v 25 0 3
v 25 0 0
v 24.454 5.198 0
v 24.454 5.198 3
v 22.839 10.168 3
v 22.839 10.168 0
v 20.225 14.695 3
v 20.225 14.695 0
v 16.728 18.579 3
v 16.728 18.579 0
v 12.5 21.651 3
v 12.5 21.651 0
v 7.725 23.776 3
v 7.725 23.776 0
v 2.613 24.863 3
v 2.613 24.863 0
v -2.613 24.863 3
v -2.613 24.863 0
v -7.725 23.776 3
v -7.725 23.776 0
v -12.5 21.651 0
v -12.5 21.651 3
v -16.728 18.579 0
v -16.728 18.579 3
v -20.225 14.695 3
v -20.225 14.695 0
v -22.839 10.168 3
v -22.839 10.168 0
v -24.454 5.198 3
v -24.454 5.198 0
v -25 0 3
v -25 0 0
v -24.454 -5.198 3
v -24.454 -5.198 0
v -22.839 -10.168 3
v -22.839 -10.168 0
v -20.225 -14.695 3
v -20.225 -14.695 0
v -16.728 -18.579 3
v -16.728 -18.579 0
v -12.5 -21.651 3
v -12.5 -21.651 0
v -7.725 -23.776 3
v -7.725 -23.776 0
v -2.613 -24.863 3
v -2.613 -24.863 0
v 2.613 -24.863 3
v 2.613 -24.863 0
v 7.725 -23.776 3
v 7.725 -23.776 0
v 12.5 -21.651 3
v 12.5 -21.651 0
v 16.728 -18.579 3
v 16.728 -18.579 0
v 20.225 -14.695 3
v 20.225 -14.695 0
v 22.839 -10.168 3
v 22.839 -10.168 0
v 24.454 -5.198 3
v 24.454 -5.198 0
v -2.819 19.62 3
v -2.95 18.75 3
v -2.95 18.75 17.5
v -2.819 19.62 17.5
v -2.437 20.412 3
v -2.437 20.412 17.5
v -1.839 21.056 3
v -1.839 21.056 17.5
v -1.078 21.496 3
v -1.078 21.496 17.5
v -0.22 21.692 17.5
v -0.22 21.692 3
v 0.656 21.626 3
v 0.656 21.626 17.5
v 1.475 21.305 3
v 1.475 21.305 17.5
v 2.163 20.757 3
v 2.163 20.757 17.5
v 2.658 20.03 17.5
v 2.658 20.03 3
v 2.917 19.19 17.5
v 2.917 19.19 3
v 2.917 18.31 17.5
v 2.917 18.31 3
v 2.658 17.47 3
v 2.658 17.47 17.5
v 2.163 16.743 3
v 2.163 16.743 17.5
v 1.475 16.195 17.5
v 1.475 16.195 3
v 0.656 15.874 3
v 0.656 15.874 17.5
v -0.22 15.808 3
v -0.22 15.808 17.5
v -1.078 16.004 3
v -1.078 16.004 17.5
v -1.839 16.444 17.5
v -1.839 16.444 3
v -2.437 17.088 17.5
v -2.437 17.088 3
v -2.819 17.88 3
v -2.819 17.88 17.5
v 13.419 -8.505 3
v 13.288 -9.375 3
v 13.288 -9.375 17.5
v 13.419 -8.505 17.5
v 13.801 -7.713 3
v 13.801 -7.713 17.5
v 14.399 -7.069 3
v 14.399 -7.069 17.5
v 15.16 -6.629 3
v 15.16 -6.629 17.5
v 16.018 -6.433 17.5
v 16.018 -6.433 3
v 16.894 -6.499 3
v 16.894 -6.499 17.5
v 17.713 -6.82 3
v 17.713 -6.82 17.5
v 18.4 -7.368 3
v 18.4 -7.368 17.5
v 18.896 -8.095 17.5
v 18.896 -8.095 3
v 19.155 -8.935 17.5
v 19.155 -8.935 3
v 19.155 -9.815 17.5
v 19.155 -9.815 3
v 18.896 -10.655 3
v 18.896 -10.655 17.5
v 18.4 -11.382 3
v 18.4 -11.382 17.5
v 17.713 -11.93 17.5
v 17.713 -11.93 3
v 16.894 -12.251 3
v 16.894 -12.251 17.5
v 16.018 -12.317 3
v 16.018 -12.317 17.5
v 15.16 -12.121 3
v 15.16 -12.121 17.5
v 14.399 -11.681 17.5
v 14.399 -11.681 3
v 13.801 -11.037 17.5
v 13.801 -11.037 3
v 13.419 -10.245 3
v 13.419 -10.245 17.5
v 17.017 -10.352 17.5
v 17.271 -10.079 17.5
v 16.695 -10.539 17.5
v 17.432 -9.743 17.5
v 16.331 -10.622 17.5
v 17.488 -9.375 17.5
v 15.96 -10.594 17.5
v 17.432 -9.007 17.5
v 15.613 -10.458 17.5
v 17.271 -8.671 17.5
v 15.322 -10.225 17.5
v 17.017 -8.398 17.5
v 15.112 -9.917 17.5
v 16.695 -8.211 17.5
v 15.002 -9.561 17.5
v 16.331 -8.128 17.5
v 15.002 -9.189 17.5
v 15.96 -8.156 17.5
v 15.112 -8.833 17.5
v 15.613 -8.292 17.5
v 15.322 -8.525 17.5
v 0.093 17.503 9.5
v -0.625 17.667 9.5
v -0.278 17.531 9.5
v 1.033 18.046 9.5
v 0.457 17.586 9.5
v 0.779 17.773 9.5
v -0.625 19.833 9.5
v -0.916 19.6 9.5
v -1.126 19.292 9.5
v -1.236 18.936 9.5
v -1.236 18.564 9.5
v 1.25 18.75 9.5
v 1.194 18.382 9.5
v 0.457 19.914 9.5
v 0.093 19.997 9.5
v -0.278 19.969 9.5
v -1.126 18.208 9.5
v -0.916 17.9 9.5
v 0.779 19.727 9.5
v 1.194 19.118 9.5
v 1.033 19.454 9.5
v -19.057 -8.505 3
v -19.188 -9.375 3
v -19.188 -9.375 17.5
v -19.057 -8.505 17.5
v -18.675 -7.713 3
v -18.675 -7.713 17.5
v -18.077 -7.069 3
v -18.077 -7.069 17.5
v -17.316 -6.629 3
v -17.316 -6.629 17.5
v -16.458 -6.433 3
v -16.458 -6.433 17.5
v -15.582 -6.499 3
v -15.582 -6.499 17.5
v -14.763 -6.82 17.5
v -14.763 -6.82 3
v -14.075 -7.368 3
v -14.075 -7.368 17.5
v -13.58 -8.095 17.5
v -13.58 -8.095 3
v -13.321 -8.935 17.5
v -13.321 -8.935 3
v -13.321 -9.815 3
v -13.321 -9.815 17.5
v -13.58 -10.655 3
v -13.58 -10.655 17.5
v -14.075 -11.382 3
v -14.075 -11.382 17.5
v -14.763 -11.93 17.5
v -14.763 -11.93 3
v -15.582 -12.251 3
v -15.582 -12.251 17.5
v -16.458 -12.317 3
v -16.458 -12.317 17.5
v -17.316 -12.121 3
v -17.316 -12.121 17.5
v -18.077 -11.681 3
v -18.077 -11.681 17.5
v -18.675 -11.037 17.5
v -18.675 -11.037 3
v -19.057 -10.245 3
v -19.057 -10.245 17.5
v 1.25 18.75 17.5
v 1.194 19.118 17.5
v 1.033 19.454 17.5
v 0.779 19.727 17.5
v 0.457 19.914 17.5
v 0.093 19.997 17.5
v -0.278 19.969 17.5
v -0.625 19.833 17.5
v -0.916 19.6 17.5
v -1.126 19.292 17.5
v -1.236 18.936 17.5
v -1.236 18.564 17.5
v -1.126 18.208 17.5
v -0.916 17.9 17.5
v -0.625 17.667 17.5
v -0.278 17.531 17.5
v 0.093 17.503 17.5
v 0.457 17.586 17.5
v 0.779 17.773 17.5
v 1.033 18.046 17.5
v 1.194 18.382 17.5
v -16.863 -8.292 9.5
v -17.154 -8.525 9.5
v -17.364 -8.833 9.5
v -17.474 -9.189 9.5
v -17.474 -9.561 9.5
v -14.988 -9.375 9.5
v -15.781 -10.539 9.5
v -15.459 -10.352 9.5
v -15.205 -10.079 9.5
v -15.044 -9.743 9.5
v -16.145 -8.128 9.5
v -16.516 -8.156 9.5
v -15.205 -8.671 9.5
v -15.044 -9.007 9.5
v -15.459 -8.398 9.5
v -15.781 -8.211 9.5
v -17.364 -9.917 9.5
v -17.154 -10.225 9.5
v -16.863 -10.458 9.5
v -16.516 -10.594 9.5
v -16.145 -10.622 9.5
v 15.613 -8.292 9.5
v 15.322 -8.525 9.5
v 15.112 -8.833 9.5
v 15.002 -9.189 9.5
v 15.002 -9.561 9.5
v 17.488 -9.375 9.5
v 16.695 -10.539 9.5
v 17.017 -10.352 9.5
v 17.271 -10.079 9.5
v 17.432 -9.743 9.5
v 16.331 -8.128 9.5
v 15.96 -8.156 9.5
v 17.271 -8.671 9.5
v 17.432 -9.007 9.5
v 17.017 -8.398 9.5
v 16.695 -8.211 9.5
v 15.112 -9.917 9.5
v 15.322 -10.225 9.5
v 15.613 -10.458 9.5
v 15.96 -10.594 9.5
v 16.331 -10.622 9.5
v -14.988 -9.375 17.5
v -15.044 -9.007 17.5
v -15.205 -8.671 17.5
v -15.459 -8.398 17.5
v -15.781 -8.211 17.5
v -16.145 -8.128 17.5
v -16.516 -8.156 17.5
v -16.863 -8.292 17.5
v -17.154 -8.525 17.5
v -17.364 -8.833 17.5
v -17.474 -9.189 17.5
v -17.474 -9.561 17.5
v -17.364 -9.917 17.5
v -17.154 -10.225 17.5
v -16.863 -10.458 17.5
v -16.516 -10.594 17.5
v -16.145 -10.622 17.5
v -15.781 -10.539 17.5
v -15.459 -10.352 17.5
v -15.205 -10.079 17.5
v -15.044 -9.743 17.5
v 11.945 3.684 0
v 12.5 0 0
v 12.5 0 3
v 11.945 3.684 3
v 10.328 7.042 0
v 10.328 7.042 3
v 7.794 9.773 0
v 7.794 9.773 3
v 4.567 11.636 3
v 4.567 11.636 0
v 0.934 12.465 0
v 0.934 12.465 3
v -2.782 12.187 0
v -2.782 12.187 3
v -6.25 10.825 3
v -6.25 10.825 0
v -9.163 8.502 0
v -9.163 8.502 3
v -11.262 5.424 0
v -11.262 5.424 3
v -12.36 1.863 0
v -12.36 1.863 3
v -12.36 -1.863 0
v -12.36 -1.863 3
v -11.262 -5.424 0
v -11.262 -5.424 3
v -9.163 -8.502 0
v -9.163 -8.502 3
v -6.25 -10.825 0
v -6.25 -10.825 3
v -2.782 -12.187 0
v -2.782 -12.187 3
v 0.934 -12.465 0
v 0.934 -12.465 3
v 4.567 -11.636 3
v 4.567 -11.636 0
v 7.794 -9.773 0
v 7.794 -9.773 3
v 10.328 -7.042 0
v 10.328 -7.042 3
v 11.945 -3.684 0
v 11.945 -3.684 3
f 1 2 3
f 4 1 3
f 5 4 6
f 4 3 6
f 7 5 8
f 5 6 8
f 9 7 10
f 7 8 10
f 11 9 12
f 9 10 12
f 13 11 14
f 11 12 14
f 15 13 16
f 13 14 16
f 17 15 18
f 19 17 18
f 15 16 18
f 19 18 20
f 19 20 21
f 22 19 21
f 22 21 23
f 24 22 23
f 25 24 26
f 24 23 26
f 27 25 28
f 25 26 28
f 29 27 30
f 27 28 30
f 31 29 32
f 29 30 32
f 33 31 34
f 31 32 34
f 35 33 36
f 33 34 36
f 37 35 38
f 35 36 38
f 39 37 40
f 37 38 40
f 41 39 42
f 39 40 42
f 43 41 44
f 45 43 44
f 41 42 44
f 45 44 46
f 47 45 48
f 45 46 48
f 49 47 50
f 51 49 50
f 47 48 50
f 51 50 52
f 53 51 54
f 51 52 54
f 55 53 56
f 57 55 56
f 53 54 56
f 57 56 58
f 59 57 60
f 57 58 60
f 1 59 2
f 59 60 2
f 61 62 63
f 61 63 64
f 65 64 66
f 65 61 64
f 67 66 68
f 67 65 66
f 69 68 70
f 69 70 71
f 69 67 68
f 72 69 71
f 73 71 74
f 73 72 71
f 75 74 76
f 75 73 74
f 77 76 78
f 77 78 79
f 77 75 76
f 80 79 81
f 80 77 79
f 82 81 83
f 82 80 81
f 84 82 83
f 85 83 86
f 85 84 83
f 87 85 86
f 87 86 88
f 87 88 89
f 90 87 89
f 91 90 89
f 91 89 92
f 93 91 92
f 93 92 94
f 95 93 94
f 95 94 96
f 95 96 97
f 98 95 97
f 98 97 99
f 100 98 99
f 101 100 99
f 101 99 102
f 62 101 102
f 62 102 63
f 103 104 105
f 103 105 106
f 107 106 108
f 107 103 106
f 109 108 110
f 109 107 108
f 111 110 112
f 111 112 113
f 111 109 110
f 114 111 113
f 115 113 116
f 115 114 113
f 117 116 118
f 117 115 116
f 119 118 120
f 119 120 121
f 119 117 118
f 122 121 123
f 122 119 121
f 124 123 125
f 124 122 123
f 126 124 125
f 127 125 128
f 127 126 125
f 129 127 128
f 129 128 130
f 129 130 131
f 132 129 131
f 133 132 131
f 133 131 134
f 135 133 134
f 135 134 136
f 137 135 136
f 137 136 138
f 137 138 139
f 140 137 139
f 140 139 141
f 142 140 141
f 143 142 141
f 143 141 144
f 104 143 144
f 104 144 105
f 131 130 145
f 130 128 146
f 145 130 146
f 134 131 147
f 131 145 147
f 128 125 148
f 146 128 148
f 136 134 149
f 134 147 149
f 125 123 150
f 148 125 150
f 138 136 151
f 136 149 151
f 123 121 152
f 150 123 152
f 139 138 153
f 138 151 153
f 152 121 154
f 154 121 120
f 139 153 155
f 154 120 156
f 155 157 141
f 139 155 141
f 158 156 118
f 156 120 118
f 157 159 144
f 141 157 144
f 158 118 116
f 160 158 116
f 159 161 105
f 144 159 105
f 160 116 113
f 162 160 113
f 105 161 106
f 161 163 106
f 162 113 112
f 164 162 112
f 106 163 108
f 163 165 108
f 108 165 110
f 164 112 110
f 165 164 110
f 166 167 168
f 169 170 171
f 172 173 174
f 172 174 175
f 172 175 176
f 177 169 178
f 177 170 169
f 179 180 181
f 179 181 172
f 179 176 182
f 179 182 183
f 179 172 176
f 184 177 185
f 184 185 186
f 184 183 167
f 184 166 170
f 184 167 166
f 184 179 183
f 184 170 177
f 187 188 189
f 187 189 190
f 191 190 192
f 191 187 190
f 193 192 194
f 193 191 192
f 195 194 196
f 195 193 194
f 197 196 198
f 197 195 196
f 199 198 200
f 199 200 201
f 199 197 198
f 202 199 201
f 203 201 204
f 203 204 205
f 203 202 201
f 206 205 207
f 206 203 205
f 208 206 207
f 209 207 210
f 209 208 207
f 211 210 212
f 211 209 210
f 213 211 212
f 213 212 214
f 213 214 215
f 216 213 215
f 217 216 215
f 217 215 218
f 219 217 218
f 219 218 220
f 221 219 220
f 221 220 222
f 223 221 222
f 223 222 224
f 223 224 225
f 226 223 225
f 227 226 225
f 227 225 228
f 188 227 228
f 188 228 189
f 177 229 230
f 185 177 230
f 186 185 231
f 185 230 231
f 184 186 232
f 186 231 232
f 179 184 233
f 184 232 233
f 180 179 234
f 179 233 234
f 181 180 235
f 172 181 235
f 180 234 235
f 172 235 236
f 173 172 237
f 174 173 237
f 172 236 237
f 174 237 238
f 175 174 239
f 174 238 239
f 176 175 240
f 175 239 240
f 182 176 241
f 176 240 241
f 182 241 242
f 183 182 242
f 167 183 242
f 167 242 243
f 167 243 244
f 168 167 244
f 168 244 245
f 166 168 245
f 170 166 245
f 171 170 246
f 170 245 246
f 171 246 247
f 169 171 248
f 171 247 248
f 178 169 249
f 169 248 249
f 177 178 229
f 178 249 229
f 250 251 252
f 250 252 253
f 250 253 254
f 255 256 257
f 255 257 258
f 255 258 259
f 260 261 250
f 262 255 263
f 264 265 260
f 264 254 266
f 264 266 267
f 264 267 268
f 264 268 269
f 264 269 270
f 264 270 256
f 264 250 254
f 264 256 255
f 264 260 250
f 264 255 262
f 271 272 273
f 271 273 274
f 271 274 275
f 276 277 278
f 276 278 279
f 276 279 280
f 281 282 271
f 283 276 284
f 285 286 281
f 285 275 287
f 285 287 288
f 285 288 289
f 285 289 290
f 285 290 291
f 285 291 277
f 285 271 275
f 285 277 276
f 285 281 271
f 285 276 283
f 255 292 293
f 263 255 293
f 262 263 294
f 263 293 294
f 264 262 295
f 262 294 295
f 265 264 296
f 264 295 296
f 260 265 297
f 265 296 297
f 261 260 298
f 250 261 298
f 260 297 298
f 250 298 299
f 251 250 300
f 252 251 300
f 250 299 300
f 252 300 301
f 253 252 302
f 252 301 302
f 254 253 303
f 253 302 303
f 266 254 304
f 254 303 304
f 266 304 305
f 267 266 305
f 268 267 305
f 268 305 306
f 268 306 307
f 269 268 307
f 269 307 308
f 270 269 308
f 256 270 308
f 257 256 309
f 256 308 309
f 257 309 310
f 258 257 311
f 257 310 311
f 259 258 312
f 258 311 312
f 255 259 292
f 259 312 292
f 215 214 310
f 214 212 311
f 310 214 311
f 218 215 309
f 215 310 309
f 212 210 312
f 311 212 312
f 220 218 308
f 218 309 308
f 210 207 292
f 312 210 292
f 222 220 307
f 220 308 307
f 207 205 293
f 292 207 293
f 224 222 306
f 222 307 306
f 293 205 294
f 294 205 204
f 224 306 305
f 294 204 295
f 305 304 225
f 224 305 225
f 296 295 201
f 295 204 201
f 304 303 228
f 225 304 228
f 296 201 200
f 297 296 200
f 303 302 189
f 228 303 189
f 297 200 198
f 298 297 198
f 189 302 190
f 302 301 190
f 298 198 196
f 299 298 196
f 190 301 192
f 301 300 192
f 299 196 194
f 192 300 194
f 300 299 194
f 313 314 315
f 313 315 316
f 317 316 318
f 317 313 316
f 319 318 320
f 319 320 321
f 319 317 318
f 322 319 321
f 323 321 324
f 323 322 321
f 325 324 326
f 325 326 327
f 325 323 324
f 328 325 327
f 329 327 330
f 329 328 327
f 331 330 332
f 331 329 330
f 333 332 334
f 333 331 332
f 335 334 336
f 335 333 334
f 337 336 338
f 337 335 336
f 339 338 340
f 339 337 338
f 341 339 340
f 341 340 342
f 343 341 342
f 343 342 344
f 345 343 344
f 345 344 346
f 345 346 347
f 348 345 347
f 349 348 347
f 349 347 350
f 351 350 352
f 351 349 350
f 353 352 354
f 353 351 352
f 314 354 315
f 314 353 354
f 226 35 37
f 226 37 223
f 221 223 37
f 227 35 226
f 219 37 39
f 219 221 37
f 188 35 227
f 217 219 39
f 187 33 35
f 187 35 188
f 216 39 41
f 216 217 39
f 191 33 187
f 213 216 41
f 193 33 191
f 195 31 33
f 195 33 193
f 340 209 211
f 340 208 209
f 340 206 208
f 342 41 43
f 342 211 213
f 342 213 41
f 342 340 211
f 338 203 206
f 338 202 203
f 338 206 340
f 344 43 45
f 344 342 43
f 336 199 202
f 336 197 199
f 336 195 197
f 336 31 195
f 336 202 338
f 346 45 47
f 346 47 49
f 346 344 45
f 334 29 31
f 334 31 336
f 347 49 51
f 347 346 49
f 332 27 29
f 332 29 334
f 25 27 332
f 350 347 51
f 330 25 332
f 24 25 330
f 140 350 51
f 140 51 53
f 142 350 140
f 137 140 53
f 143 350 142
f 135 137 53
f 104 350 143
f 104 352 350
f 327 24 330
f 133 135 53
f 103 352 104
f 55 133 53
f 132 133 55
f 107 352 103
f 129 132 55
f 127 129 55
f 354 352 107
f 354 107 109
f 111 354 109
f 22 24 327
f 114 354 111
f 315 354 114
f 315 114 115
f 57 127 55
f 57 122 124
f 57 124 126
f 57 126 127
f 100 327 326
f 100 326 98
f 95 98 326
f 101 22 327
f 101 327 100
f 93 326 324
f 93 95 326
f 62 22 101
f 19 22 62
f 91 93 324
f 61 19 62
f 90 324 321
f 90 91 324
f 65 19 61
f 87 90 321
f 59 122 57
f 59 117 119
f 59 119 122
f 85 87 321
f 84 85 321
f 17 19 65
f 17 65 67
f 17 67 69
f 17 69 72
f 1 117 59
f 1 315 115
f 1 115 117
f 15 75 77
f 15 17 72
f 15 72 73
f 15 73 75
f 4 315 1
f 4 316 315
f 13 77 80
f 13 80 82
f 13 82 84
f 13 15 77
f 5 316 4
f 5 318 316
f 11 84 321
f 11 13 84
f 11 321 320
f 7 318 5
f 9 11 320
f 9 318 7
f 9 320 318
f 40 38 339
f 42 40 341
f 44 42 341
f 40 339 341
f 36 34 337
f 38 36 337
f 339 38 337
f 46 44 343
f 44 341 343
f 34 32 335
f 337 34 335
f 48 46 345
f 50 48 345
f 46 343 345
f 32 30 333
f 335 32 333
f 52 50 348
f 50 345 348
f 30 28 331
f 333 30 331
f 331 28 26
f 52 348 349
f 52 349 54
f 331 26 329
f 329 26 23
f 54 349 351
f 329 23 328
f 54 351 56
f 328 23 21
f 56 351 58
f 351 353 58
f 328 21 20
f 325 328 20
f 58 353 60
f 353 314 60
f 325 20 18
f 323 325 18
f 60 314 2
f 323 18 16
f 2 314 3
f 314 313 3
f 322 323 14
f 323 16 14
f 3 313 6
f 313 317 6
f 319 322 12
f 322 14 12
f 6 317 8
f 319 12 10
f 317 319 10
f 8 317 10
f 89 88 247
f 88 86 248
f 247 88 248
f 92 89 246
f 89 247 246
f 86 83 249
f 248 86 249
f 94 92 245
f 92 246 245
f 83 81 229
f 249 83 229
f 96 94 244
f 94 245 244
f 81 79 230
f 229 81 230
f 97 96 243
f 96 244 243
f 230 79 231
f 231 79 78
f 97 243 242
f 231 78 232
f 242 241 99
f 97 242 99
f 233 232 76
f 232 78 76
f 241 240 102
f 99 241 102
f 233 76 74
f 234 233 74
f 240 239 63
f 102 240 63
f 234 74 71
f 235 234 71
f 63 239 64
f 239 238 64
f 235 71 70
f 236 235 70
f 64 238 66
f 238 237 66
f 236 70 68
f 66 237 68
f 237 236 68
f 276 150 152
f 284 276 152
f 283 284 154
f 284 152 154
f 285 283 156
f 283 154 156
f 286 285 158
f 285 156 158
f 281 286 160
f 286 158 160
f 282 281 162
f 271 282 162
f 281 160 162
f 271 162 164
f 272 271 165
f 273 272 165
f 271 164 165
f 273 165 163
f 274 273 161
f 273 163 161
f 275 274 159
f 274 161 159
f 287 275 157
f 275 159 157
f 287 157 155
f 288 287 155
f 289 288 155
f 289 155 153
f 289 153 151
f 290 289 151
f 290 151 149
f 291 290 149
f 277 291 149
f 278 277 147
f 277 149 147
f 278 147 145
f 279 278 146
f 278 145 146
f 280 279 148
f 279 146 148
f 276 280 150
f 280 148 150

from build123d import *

# Parameters (mm, degrees)
SKETCH1_R           = 25
SKETCH1_R_2         = 12.5
SKETCH1_R_3         = 2.95
BOSS_EXTRUDE1_DEPTH = 3
SKETCH4_R           = 2.95
BOSS_EXTRUDE3_DEPTH = 17.5
SKETCH5_R           = 1.25
CUT_EXTRUDE2_DEPTH  = 8


with BuildPart() as part:
    # Sketch1 → Boss-Extrude1 (new body)
    with BuildSketch(Plane.XY):
        Circle(SKETCH1_R)
        Circle(SKETCH1_R_2, mode=Mode.SUBTRACT)
        with Locations((0, 18.75)):
            Circle(SKETCH1_R_3, mode=Mode.SUBTRACT)
        with Locations((16.237976321, -9.375)):
            Circle(SKETCH1_R_3, mode=Mode.SUBTRACT)
        with Locations((-16.237976321, -9.375)):
            Circle(SKETCH1_R_3, mode=Mode.SUBTRACT)
    extrude(amount=BOSS_EXTRUDE1_DEPTH)

    # Sketch4 → Boss-Extrude3 (add)
    with BuildSketch(Plane(origin=(0, 0, 0), x_dir=(-1, 0, 0), z_dir=(0, 0, -1))):
        with Locations((16.237976321, -9.375)):
            Circle(SKETCH4_R)
        with Locations((0, 18.75)):
            Circle(SKETCH4_R)
        with Locations((-16.237976321, -9.375)):
            Circle(SKETCH4_R)
    extrude(amount=-BOSS_EXTRUDE3_DEPTH)

    # Sketch5 → Cut-Extrude2 (cut)
    with BuildSketch(Plane.XY.offset(17.5)):
        with Locations((16.237976321, -9.375)):
            Circle(SKETCH5_R)
        with Locations((-16.237976321, -9.375)):
            Circle(SKETCH5_R)
        with Locations((0, 18.75)):
            Circle(SKETCH5_R)
    extrude(amount=-CUT_EXTRUDE2_DEPTH, mode=Mode.SUBTRACT)


solid = part.part
